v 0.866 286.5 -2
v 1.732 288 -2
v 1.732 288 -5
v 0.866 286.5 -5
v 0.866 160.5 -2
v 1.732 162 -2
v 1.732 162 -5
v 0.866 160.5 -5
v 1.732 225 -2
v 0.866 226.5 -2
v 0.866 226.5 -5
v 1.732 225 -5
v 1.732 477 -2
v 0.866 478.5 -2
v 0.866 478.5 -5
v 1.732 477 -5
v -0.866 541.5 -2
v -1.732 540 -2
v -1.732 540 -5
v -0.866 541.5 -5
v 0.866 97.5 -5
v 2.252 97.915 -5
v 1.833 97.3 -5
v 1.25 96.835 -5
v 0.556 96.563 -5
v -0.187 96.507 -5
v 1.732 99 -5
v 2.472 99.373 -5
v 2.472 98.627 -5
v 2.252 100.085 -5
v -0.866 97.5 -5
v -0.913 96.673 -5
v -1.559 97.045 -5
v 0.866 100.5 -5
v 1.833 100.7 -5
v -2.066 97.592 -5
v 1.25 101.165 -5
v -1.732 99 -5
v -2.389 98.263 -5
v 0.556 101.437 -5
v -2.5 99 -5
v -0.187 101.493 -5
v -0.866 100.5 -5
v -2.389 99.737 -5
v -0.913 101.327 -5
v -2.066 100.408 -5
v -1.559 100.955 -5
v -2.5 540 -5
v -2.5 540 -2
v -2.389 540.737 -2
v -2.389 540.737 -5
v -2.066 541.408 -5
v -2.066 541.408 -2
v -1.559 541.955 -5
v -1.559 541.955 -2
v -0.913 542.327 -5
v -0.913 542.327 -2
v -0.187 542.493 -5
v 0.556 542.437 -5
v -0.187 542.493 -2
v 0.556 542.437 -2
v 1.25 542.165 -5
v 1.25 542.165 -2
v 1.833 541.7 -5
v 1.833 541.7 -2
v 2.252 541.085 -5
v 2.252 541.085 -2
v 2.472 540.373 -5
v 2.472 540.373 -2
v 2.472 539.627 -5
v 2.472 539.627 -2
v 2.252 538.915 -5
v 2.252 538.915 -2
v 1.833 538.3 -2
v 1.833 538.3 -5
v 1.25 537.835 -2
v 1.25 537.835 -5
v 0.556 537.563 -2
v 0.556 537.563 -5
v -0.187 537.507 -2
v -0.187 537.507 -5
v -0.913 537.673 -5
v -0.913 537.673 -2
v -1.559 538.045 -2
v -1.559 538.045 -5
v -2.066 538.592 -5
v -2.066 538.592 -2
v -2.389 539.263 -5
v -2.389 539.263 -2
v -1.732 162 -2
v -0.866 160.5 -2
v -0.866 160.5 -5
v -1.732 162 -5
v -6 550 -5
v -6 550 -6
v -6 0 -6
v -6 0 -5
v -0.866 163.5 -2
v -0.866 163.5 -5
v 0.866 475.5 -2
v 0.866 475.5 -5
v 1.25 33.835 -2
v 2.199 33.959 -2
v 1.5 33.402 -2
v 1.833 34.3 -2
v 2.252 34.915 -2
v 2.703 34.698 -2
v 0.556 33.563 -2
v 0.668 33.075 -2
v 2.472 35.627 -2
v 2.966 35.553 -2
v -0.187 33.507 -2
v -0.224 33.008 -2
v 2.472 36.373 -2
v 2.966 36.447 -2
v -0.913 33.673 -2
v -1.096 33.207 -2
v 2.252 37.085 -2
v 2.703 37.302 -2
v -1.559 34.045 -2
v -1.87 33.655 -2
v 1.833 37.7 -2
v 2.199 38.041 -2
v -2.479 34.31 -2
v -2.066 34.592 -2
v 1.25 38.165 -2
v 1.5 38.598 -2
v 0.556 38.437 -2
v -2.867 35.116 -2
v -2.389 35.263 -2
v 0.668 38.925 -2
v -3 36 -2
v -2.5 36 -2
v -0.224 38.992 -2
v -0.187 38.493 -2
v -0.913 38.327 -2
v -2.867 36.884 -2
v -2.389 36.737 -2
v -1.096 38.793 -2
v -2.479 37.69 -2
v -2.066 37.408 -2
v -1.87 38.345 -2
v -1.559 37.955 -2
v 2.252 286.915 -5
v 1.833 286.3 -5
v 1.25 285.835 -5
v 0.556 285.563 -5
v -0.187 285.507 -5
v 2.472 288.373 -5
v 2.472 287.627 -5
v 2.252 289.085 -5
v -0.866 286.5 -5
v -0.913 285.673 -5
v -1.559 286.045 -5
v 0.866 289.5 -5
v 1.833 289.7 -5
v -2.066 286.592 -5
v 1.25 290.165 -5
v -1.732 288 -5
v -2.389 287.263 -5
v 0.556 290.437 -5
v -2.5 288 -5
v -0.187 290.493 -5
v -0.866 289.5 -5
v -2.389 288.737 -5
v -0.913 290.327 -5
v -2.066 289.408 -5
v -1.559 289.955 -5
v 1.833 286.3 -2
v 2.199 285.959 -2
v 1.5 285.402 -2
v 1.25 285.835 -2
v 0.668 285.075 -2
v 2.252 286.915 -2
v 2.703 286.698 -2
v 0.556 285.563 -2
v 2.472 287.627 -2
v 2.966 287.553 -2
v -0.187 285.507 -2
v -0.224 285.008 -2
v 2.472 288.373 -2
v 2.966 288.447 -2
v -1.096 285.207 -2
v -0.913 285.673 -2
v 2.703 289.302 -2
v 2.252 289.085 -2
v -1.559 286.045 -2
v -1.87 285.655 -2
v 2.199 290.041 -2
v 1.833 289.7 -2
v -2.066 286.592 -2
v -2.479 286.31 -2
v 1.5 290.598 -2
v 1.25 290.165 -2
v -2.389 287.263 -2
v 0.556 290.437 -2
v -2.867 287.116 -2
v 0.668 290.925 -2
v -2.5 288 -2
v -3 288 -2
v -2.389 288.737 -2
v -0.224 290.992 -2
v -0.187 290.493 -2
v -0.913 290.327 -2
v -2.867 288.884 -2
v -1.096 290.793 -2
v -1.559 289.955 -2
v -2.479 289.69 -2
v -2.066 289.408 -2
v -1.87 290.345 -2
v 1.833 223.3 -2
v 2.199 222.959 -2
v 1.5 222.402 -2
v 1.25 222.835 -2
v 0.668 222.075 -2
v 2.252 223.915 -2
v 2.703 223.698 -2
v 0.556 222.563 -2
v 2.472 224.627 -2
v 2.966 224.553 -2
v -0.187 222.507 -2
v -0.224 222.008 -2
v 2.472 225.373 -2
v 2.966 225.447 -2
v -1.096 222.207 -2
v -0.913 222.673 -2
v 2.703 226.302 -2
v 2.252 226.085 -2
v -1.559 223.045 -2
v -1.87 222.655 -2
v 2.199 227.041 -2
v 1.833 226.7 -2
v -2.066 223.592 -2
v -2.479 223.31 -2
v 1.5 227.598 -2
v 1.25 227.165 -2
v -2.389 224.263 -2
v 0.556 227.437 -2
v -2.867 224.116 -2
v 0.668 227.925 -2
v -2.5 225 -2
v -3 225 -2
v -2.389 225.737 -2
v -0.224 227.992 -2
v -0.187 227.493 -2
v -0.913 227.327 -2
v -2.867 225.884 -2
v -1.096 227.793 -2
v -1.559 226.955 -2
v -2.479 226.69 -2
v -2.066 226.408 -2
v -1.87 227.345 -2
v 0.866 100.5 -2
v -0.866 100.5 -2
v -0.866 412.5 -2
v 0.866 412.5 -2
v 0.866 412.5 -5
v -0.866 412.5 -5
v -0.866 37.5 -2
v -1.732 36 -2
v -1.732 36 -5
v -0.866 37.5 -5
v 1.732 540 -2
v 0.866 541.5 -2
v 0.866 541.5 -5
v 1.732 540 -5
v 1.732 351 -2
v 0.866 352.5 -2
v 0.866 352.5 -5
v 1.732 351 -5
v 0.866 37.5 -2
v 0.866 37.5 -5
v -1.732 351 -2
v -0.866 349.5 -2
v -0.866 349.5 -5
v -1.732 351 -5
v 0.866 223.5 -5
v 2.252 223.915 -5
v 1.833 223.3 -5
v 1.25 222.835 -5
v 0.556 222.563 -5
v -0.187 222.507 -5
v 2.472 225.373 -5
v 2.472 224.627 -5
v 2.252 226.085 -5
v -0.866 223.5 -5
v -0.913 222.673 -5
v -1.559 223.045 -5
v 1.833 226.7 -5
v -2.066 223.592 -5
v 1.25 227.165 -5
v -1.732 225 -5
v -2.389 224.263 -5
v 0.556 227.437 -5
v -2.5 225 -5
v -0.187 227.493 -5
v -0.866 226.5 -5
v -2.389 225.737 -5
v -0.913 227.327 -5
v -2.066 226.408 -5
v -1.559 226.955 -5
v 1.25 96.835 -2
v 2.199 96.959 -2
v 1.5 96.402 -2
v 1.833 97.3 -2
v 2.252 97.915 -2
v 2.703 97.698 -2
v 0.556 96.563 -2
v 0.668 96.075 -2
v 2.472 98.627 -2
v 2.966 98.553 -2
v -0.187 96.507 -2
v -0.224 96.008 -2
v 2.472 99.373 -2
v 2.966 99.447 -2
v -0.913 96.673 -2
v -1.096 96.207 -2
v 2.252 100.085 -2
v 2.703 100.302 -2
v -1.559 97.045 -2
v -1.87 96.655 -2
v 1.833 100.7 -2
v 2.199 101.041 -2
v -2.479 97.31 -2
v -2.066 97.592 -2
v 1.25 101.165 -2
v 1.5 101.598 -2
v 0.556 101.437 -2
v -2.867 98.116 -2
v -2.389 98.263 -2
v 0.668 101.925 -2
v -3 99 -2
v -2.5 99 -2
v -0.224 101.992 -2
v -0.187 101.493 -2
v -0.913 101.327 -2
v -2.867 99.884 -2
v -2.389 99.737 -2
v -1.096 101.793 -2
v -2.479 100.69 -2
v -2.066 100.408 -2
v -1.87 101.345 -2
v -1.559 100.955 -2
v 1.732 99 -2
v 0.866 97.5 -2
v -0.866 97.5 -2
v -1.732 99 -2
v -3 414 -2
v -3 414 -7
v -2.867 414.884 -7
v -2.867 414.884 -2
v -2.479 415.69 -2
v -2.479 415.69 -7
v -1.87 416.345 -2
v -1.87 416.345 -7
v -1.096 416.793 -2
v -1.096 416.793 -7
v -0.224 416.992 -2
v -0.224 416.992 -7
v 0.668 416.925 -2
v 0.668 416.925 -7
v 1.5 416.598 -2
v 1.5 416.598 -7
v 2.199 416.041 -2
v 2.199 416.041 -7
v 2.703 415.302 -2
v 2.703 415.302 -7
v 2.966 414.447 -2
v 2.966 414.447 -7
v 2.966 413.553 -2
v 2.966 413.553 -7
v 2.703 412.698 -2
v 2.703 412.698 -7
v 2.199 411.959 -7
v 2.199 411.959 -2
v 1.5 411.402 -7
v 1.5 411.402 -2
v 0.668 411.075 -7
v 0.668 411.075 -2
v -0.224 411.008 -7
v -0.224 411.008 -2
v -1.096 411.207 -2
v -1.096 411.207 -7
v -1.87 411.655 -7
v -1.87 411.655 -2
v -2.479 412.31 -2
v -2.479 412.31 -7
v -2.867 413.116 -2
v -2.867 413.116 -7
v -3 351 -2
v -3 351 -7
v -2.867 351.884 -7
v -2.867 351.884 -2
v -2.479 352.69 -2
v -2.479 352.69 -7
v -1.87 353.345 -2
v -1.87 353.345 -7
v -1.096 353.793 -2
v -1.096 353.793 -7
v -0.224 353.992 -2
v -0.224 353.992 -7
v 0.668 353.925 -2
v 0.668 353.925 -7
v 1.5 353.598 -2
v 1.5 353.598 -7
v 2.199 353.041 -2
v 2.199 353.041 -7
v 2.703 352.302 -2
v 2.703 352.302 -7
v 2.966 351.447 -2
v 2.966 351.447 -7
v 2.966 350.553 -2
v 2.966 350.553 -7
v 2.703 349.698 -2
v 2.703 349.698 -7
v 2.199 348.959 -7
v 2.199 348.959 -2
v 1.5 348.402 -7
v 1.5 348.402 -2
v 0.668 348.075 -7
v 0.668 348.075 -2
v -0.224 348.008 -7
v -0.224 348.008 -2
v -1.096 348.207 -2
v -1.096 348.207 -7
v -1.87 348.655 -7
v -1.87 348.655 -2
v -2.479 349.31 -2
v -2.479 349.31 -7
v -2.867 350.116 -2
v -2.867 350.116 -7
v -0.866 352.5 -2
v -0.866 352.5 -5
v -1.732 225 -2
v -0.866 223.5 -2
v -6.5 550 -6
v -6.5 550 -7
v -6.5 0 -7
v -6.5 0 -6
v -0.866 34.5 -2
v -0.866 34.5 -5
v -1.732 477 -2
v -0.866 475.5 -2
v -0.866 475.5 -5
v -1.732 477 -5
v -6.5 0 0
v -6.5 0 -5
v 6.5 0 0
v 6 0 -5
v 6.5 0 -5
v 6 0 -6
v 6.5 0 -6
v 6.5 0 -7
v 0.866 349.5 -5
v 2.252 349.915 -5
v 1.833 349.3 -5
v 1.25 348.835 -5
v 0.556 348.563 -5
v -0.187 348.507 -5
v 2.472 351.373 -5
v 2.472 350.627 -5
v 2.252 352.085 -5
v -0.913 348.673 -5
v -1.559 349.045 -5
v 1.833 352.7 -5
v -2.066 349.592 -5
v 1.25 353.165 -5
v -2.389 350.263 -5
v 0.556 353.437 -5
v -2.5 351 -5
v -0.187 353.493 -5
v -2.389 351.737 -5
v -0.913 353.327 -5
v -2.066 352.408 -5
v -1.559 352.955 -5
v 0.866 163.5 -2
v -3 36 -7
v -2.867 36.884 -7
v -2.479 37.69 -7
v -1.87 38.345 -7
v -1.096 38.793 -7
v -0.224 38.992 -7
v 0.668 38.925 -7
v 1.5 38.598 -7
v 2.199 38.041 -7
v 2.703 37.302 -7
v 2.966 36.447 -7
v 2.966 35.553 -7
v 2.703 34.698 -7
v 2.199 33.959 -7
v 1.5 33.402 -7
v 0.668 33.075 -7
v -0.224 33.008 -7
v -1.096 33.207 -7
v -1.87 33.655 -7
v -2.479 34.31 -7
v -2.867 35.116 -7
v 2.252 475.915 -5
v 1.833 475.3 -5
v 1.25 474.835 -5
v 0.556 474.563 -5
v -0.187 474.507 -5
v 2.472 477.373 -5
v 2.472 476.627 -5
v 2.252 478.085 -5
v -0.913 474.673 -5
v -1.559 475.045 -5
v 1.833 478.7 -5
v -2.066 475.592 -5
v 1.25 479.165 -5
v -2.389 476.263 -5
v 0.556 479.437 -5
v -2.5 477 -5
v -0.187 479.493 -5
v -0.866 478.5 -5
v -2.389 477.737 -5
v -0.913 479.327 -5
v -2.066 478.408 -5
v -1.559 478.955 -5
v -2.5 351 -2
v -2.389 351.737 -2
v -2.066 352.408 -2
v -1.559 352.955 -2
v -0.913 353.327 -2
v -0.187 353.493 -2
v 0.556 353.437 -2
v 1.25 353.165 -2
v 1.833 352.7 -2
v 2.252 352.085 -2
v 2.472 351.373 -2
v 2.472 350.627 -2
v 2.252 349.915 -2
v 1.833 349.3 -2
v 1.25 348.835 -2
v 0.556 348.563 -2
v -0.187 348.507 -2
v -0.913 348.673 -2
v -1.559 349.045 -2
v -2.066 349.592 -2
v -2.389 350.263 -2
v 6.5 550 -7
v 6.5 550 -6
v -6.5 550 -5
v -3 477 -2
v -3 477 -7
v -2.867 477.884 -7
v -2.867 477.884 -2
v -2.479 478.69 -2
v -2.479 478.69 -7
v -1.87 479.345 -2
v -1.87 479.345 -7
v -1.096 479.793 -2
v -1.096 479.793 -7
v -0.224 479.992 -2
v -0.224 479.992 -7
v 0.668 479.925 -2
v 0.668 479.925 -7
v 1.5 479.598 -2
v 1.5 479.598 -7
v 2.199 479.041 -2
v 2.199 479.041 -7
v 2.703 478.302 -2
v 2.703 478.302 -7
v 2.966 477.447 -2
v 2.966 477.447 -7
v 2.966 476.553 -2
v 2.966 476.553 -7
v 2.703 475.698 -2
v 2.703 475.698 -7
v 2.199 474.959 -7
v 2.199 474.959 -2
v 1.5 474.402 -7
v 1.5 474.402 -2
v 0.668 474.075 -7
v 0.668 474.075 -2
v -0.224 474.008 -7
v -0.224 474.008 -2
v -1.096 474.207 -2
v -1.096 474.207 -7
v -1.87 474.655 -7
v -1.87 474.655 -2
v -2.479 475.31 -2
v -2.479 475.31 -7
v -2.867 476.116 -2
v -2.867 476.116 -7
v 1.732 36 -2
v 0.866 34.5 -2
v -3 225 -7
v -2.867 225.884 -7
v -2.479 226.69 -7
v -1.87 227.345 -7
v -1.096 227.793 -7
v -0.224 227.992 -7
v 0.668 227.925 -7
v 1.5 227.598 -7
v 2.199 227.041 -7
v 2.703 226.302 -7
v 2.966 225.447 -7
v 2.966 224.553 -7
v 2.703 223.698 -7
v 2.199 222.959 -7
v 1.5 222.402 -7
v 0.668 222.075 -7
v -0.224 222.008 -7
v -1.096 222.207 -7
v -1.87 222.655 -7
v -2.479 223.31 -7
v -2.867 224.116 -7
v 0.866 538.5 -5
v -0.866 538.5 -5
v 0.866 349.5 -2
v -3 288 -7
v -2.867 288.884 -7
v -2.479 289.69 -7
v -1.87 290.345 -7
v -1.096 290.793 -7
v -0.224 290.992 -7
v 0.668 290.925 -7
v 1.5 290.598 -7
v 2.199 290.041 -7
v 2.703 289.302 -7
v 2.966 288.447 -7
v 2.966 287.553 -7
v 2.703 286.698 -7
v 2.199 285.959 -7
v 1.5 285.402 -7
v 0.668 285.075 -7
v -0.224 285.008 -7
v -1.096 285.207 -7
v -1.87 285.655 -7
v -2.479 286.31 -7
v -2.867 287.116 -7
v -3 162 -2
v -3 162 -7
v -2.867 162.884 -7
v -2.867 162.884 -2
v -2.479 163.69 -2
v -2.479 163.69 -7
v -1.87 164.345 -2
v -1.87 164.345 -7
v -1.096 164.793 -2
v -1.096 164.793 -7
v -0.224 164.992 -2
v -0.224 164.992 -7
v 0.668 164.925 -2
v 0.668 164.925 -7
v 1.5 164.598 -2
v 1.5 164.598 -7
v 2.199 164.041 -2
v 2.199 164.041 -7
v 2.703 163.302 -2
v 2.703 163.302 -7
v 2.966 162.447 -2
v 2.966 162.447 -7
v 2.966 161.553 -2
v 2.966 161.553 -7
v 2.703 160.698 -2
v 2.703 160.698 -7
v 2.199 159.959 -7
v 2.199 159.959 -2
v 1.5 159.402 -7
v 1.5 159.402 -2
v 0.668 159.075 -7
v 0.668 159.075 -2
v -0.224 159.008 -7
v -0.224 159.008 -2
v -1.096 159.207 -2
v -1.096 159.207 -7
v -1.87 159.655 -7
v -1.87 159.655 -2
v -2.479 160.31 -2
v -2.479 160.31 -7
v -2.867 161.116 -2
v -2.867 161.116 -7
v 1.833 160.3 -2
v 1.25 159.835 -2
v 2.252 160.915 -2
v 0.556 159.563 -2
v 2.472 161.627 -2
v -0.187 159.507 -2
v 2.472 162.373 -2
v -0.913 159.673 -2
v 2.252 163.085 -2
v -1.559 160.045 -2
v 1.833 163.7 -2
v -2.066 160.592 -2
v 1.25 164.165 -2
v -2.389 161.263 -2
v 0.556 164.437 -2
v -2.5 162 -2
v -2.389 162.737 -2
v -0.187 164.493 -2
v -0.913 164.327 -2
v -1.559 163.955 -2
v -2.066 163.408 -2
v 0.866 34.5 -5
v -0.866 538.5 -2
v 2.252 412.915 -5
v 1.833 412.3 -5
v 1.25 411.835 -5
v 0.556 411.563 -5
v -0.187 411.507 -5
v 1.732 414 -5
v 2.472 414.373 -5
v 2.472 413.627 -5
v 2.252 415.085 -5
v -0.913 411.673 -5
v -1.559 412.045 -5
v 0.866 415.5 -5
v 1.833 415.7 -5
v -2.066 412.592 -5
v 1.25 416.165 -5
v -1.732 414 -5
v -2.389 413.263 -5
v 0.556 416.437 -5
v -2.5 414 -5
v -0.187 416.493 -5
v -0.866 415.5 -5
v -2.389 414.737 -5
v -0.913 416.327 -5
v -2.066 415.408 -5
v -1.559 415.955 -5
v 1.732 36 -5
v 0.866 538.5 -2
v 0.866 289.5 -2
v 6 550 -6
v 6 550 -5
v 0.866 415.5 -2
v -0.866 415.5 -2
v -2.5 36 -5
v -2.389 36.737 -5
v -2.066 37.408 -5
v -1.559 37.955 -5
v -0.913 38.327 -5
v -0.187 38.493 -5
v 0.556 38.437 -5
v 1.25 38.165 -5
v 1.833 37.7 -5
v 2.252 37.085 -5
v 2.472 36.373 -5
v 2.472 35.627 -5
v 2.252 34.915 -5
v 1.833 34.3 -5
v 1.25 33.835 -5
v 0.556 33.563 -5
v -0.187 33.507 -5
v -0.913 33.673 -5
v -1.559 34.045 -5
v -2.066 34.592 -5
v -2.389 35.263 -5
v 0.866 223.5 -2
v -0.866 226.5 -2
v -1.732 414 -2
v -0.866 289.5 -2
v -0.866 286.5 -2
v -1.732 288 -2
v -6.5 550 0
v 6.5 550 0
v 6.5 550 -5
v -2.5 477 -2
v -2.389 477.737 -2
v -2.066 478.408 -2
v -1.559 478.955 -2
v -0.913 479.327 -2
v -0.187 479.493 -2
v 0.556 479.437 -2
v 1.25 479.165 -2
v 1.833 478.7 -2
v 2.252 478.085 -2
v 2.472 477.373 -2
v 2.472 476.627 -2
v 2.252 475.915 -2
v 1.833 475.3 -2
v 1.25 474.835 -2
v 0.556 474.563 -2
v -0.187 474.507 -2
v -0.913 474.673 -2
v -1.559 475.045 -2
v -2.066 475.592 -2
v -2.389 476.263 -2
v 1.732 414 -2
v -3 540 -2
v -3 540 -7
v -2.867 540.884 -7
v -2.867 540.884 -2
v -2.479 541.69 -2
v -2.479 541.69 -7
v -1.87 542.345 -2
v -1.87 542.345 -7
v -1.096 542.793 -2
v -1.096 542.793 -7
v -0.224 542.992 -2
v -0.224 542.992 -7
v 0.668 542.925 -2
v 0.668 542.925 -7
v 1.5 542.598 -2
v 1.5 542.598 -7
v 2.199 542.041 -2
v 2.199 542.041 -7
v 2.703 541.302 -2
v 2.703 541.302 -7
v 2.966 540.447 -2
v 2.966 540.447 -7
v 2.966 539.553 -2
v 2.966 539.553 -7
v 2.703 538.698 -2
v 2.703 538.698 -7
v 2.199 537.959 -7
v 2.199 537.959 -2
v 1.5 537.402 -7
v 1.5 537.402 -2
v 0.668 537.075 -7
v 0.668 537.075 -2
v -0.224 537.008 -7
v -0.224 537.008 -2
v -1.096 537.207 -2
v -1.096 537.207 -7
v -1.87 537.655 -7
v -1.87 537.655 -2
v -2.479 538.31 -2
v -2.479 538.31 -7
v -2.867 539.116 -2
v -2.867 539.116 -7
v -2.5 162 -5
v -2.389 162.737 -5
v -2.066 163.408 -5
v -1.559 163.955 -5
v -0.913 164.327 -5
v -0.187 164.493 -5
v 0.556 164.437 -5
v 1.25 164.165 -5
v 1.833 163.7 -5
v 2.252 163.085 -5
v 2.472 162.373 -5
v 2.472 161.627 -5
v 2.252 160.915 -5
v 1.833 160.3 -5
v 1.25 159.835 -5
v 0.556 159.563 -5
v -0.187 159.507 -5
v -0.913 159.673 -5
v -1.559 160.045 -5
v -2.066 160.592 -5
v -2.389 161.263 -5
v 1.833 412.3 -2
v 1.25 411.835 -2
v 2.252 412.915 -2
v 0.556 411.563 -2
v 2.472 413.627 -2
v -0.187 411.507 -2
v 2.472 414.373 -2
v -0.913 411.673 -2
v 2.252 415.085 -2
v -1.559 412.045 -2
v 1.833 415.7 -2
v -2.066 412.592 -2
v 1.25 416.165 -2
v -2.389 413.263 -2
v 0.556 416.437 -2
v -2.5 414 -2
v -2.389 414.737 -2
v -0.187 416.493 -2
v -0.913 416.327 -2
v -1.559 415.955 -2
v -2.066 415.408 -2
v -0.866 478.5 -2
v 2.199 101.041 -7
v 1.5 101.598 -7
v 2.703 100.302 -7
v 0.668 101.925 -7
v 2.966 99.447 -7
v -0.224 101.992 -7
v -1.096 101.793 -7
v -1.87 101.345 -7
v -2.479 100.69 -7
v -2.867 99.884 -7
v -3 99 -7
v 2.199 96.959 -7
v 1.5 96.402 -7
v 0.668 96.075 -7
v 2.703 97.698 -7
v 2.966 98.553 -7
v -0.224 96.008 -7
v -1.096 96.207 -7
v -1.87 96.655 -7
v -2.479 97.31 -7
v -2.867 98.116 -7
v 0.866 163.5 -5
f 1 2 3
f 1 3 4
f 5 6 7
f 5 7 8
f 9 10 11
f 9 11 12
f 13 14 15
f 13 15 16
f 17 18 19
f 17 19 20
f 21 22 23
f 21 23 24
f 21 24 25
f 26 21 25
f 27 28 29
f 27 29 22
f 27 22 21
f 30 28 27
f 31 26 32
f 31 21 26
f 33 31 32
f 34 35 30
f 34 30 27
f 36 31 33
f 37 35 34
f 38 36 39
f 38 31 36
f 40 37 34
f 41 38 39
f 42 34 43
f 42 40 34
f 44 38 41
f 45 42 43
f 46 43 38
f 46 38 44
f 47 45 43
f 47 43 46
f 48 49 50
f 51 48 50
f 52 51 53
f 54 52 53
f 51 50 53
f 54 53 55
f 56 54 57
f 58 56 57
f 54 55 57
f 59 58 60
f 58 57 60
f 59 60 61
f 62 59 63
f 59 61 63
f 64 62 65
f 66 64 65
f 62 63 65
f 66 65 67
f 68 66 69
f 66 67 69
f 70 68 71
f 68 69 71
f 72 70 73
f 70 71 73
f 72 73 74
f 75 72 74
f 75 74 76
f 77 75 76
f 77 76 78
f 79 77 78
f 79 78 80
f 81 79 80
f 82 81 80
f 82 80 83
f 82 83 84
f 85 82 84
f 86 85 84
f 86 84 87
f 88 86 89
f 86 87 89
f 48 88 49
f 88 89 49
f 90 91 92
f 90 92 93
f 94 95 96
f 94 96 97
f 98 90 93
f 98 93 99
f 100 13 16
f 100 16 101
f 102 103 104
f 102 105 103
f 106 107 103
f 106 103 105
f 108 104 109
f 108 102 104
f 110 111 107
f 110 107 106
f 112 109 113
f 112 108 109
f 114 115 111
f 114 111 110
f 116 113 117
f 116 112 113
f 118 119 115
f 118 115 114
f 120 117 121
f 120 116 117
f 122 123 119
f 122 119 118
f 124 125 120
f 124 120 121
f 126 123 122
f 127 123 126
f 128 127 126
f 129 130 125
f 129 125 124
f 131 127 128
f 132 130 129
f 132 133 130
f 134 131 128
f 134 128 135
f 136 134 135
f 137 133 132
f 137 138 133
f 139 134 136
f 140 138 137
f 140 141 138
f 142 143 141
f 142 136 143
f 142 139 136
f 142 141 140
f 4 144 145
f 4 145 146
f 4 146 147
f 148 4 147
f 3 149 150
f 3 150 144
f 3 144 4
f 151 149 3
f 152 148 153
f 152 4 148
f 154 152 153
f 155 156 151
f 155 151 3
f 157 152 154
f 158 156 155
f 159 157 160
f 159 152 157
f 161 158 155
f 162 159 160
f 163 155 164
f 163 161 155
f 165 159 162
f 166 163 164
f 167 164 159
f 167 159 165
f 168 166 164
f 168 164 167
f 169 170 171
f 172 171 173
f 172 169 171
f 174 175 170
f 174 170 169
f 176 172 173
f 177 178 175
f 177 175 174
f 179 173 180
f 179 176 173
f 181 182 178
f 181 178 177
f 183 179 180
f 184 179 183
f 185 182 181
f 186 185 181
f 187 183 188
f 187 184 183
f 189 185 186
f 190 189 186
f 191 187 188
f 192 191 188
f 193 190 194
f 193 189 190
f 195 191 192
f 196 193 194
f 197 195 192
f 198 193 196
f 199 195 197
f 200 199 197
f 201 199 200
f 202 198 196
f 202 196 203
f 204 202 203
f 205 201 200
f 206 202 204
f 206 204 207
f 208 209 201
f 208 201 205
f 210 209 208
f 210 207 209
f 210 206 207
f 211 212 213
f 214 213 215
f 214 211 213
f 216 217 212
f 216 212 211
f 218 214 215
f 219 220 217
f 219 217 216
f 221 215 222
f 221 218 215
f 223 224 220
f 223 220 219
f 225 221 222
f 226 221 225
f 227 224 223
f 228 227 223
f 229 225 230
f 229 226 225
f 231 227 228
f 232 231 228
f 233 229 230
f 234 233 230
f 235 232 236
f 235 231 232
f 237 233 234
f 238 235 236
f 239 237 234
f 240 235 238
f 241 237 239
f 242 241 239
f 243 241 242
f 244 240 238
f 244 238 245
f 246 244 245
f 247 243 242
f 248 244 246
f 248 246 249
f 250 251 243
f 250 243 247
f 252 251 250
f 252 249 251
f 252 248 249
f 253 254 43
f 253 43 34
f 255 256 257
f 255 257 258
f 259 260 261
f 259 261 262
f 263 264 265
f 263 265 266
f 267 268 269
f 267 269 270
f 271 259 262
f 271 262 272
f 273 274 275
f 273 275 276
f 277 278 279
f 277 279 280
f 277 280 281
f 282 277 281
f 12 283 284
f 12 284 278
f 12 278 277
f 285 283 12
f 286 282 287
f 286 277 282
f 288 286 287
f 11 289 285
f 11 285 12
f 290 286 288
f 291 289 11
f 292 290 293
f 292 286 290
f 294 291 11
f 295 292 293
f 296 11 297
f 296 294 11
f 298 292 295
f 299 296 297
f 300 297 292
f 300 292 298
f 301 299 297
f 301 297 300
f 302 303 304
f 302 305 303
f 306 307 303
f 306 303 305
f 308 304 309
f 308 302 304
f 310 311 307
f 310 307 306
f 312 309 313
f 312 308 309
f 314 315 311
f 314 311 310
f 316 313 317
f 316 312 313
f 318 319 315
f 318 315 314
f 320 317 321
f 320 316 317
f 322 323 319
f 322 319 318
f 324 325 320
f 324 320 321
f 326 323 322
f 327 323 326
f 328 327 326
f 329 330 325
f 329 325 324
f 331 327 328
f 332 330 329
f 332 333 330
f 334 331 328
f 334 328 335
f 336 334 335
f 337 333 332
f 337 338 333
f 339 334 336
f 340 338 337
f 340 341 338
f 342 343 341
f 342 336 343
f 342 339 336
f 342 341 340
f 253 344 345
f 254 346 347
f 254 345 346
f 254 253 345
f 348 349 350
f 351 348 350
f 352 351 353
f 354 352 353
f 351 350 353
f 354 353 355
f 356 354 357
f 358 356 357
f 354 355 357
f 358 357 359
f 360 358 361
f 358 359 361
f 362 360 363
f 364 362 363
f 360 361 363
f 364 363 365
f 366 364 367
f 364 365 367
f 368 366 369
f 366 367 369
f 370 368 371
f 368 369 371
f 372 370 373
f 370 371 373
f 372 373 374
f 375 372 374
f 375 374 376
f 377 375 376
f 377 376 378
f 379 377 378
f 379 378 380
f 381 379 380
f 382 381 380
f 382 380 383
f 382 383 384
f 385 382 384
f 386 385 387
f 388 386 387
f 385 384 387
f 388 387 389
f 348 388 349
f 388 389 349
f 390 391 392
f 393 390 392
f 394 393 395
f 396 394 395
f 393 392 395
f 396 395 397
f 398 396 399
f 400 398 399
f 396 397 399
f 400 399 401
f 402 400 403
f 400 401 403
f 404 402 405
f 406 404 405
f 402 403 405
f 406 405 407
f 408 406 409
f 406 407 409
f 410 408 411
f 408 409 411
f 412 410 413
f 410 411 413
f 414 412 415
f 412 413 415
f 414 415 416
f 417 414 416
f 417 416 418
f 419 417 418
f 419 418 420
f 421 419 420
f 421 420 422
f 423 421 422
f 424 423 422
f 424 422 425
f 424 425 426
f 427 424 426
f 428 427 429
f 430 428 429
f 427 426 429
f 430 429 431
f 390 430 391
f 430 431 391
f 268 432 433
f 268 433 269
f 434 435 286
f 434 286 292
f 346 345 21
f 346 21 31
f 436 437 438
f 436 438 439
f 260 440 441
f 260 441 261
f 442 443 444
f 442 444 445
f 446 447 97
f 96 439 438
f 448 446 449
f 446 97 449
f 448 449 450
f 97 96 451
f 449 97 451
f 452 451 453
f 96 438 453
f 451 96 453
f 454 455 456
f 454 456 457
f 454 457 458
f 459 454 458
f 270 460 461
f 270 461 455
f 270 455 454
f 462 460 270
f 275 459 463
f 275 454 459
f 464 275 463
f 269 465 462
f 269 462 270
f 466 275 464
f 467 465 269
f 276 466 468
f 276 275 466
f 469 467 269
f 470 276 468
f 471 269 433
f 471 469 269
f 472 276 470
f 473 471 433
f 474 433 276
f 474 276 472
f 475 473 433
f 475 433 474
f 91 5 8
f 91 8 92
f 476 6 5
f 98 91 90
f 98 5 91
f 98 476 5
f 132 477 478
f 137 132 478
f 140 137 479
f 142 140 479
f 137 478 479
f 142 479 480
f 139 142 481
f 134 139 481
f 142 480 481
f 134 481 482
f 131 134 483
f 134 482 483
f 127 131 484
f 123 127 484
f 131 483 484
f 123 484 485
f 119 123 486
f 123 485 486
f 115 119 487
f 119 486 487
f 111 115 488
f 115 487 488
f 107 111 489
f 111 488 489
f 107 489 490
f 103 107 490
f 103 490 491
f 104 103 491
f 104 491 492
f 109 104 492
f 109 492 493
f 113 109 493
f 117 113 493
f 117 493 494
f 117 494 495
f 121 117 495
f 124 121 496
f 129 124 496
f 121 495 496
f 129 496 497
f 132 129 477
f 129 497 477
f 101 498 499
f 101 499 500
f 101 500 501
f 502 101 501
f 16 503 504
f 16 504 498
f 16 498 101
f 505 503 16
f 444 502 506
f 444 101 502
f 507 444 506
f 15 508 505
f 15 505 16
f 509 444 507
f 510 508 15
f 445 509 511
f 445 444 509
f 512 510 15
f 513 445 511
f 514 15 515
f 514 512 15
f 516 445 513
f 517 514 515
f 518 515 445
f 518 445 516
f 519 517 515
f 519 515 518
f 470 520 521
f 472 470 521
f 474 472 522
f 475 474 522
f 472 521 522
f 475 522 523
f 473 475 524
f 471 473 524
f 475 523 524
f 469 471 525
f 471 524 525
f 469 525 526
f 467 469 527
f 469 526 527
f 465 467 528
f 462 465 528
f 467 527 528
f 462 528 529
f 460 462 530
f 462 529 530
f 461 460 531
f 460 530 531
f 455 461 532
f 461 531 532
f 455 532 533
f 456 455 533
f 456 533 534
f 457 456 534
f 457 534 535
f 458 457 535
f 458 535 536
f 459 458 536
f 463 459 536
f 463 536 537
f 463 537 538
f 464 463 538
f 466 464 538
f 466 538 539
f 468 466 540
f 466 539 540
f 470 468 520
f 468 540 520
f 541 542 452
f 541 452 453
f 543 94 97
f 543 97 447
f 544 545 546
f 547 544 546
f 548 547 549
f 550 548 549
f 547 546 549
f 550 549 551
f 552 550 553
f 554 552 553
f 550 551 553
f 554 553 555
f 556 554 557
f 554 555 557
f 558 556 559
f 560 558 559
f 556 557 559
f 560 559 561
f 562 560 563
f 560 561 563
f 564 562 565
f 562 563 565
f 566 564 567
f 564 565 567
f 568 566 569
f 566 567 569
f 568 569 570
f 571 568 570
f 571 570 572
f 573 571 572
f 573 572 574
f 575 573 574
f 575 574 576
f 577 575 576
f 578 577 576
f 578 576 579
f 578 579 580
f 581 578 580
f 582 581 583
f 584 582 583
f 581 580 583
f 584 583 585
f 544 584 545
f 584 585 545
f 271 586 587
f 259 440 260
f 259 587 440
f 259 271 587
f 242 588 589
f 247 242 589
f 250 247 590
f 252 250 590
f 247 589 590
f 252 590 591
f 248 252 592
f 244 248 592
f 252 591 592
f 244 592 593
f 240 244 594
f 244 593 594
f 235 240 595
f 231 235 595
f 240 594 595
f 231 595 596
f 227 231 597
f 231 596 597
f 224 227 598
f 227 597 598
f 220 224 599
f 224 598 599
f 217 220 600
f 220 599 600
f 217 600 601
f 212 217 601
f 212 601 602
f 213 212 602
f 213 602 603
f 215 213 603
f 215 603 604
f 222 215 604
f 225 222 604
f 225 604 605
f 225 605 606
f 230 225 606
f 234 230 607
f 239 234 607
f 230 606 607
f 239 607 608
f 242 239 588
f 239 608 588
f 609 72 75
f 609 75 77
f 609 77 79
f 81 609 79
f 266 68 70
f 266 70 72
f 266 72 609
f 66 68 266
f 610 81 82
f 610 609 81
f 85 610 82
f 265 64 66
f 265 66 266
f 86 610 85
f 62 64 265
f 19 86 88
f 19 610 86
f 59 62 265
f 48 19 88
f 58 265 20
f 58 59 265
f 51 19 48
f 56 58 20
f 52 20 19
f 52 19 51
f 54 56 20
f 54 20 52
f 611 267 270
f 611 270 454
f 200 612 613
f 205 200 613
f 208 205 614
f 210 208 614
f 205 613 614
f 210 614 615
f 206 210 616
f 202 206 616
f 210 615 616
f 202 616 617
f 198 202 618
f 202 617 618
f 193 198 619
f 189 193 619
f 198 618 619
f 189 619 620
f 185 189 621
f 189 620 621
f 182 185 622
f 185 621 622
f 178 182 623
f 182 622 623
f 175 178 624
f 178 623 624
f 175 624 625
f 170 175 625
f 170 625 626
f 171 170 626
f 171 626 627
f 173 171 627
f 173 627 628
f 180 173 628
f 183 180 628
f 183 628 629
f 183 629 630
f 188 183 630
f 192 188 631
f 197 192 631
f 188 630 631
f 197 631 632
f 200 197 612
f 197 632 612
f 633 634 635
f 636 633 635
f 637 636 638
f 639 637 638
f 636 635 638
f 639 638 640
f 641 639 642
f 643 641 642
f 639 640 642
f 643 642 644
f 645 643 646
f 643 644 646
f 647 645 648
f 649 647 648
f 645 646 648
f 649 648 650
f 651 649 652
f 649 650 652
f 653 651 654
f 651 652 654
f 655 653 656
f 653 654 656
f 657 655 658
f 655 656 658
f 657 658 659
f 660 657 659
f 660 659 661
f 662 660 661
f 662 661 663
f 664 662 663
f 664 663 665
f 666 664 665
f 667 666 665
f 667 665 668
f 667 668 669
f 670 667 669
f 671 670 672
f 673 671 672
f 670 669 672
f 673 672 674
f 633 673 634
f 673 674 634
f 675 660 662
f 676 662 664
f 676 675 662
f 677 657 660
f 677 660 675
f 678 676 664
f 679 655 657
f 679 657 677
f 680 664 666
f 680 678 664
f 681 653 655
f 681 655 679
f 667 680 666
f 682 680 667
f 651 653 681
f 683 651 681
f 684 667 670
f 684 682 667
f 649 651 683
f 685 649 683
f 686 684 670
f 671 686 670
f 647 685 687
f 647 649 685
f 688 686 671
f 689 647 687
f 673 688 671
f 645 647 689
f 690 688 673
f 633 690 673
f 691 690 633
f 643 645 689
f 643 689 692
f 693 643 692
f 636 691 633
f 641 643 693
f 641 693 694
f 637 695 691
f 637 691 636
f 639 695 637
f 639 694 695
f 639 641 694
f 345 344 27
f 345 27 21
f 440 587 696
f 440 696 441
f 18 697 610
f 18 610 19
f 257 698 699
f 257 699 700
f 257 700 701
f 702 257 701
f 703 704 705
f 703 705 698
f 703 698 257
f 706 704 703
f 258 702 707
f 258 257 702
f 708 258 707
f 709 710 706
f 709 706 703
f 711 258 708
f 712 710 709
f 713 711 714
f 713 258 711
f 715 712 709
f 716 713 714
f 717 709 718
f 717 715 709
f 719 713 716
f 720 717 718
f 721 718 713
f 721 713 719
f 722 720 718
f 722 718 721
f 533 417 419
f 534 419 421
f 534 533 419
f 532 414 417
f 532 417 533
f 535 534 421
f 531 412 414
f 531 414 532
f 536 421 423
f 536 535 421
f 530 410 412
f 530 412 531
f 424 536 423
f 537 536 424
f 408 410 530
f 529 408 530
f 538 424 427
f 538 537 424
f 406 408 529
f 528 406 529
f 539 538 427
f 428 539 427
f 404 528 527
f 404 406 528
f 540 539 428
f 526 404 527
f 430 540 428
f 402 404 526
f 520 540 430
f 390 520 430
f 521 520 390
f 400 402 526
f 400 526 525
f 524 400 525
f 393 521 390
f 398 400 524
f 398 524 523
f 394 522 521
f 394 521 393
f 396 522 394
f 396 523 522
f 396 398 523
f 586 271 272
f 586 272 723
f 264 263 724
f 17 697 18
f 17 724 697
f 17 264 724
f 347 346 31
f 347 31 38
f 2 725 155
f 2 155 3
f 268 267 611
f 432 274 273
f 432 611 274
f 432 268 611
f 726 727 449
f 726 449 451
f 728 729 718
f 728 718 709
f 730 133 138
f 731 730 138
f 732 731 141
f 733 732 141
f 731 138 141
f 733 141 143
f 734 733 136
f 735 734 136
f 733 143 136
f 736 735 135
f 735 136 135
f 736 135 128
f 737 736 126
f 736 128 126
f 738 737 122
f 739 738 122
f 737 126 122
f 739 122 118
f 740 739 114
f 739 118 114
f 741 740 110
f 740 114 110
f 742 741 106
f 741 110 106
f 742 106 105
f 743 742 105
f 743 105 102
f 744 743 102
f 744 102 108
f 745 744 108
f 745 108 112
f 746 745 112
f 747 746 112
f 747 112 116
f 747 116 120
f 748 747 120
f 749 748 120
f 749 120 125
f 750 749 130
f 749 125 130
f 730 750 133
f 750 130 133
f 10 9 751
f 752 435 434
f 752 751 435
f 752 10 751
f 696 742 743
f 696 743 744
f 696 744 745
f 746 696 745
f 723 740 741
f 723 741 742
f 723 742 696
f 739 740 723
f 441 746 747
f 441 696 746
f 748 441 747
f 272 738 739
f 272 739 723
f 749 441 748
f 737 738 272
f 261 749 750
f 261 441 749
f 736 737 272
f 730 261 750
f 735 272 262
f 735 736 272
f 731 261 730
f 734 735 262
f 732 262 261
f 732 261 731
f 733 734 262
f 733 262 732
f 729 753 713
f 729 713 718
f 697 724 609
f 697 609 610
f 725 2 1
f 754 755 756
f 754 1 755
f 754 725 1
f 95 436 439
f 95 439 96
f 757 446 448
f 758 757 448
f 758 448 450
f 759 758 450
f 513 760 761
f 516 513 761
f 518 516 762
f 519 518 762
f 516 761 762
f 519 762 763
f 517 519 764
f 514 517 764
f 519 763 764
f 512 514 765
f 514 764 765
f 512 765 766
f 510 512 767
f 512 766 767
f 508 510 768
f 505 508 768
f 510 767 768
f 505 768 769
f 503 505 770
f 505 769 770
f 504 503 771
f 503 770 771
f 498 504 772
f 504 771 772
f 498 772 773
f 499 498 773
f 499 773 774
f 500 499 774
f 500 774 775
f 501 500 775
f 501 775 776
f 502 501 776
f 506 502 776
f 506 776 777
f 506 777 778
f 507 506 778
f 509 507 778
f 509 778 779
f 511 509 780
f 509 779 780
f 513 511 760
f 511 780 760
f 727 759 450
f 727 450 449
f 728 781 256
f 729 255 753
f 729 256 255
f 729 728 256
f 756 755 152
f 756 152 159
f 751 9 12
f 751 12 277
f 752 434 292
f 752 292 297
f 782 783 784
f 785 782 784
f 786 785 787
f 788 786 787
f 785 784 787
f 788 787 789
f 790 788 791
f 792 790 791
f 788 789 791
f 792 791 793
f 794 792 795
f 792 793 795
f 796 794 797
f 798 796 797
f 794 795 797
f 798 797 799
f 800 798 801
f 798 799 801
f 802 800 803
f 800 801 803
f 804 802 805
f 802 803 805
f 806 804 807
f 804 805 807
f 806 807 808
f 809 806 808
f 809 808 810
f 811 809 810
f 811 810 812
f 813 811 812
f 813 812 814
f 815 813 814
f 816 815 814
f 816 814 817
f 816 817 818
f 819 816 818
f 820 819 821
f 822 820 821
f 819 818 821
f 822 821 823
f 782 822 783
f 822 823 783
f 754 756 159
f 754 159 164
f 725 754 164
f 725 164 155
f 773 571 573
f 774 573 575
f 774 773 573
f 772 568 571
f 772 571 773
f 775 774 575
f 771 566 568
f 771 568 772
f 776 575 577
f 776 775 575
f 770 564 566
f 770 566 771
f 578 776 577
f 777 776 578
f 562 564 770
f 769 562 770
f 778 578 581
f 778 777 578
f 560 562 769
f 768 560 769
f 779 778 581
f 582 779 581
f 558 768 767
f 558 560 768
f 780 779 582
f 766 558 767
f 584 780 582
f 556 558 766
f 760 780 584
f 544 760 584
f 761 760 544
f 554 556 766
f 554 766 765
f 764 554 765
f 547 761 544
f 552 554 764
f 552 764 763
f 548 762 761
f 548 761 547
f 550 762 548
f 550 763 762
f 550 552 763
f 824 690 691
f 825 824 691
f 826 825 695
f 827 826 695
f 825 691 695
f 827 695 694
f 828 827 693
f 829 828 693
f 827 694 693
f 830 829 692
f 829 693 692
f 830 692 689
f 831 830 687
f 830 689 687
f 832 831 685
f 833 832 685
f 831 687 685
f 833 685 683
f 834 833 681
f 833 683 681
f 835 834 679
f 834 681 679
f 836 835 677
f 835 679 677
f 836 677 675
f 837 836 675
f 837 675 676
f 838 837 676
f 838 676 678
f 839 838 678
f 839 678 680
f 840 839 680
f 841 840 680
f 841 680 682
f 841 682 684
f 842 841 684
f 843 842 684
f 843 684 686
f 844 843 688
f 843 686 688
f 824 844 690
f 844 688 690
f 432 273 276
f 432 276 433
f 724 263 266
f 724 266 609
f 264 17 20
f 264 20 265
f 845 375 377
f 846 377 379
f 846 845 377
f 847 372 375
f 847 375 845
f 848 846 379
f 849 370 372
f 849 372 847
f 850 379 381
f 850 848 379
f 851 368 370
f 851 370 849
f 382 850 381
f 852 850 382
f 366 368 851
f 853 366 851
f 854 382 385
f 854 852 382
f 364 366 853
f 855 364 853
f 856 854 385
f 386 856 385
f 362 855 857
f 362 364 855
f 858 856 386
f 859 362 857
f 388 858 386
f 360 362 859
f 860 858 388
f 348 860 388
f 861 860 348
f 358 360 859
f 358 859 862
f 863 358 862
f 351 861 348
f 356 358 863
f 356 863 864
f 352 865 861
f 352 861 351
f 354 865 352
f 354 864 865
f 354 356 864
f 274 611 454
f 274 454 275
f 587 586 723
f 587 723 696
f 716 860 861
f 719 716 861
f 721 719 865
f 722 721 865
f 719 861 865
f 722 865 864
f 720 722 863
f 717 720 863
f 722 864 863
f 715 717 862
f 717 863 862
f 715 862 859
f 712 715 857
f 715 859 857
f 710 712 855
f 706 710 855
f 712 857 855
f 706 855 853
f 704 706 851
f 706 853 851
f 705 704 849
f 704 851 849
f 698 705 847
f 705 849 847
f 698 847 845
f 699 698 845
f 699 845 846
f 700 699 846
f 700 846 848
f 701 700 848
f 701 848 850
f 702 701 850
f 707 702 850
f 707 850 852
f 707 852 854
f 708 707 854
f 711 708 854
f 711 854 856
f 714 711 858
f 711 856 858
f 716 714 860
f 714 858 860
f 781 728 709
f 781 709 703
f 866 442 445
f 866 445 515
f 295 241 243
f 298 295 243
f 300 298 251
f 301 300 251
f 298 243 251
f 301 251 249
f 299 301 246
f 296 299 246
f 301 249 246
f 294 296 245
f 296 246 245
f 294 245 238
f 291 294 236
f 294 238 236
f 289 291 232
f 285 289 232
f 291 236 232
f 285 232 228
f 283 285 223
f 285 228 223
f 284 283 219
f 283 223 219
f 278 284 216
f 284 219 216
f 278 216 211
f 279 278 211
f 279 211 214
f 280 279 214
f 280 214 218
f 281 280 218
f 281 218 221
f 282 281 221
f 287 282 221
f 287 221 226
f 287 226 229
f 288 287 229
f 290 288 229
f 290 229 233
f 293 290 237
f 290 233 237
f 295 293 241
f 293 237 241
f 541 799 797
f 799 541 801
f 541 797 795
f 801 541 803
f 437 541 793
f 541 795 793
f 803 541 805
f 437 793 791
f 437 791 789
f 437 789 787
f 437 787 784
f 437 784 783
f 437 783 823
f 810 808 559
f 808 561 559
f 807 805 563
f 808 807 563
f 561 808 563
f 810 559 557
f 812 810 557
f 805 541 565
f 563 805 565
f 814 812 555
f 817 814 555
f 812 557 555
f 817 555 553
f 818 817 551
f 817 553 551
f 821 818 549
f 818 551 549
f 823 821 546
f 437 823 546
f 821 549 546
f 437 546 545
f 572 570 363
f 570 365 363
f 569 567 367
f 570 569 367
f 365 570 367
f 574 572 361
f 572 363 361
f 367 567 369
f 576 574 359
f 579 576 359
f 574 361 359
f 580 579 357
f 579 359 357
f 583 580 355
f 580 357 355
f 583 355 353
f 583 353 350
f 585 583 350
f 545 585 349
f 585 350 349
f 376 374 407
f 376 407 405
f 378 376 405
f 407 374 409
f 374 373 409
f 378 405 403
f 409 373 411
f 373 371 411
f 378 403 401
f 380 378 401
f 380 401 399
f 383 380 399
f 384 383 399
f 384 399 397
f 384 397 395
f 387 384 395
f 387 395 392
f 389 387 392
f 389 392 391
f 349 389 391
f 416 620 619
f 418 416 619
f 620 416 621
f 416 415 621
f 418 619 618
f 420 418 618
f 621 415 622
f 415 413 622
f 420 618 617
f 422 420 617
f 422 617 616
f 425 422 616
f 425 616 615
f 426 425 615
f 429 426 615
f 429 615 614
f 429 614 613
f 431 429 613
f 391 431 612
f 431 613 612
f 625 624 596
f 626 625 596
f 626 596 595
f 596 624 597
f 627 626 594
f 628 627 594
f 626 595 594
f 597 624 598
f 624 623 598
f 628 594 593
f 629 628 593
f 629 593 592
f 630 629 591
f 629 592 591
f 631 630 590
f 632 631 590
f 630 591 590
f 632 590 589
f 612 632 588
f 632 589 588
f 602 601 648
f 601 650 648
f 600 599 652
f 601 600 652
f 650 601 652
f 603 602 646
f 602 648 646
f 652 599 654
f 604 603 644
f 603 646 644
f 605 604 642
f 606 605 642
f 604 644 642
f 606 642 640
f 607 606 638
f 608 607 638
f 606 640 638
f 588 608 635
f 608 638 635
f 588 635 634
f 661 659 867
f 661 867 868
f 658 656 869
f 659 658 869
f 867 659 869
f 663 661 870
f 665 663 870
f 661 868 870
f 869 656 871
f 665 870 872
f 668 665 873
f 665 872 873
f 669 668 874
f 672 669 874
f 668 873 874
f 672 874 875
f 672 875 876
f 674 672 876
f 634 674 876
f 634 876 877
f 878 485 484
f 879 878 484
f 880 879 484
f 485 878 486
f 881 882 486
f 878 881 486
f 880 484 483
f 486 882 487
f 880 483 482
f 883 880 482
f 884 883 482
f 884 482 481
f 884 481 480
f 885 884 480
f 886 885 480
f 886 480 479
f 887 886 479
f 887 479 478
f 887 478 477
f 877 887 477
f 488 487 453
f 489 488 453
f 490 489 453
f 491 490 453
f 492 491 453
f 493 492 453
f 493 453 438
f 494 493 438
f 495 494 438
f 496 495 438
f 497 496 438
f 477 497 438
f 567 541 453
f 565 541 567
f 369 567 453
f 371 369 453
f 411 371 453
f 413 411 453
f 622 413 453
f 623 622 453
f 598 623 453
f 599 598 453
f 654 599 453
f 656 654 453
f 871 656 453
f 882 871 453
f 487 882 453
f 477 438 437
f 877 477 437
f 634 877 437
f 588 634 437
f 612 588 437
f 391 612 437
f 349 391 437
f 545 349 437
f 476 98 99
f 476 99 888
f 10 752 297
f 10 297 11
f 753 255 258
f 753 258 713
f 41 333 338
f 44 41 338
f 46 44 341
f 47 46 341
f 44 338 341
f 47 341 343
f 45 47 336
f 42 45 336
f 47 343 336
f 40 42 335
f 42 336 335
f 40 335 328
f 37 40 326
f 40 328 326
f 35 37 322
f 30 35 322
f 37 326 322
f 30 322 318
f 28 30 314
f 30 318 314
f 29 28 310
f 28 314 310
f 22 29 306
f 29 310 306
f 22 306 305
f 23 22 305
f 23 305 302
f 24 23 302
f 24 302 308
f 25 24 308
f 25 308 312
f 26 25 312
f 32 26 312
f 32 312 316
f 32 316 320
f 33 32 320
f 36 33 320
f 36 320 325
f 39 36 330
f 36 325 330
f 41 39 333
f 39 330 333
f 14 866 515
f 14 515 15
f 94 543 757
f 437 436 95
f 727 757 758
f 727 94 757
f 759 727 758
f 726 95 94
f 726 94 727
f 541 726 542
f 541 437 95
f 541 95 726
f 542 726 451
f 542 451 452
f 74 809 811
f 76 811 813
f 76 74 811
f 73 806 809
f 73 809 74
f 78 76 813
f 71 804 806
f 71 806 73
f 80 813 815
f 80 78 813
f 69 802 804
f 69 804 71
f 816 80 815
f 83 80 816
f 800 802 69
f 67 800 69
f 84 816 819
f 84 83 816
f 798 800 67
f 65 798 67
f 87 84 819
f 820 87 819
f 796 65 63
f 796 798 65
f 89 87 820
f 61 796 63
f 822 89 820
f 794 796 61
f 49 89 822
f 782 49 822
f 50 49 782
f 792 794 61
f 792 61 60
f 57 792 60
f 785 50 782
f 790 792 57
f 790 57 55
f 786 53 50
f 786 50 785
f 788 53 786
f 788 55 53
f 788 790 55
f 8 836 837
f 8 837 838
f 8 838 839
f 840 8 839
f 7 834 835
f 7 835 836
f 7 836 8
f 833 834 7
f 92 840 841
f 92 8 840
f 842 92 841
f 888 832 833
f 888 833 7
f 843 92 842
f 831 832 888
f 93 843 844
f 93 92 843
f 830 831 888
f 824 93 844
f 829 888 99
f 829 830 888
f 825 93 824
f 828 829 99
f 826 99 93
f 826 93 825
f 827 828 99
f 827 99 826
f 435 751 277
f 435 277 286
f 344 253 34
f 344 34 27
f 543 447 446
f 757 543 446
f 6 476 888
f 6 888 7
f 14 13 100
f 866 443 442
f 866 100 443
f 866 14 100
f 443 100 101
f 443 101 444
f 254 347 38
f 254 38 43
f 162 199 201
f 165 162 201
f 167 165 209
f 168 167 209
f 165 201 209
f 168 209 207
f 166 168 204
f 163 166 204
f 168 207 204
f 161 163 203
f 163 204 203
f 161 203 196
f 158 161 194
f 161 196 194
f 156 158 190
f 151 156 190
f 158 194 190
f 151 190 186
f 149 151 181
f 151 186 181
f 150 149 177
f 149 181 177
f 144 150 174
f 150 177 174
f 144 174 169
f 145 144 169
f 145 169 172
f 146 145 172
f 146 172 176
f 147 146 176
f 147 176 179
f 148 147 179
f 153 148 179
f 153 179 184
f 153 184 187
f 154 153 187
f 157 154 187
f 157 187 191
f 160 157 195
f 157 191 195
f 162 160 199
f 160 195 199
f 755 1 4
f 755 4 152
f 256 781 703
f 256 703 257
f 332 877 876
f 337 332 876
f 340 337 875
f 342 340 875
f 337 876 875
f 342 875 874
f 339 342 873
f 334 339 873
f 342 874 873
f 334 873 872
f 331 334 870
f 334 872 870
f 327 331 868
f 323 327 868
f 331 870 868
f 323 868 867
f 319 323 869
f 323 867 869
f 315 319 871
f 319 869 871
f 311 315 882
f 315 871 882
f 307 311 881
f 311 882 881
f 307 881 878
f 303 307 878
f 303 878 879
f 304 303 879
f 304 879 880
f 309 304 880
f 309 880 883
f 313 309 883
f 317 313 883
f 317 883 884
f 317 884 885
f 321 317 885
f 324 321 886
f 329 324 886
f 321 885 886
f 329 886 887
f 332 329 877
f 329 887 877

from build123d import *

# Parameters (mm, degrees)
EXTRUDE_1_DEPTH        = 550
SKETCH_3_R             = 3
CUT_EXTRUDE_2_DEPTH    = 5
SKETCH_4_R             = 2.5
EXTRUDE_2_DEPTH        = 3
PATTERN_LINEAR_1_COUNT = 9
PATTERN_LINEAR_1_PITCH = 63


with BuildPart() as part:
    # 草圖1 → 填料-伸長1 (new body)
    with BuildSketch(Plane(origin=(0, 0, 0), x_dir=(1, 0, 0), z_dir=(0, 1, 0))):
        Polygon((-6.5, 0), (6.5, 0), (6.5, 5), (6, 5), (6, 6), (6.5, 6), (6.5, 7), (-6.5, 7), (-6.5, 6), (-6, 6), (-6, 5), (-6.5, 5), align=None)
    extrude(amount=EXTRUDE_1_DEPTH)

    # 草圖3 → 除料-伸長2 (cut)
    with BuildSketch(Plane(origin=(0, 0, -7), x_dir=(-1, 0, 0), z_dir=(0, 0, -1))):
        with Locations((0, 540)):
            Circle(SKETCH_3_R)
    cut_extrude_2 = extrude(amount=-CUT_EXTRUDE_2_DEPTH, mode=Mode.SUBTRACT)

    # 草圖4 → 填料-伸長2 (add)
    with BuildSketch(Plane(origin=(0, 0, -2), x_dir=(-1, 0, 0), z_dir=(0, 0, -1))):
        with Locations((0, 540)):
            Circle(SKETCH_4_R)
        Polygon((1.732050808, 540), (0.866025404, 541.5), (-0.866025404, 541.5), (-1.732050808, 540), (-0.866025404, 538.5), (0.866025404, 538.5), align=None, mode=Mode.SUBTRACT)
    extrude_2 = extrude(amount=EXTRUDE_2_DEPTH)

    # 直線複製排列1: 除料-伸長2, 填料-伸長2 ×9
    with Locations(*[(0, -i * PATTERN_LINEAR_1_PITCH, 0) for i in range(1, PATTERN_LINEAR_1_COUNT)]):
        add(cut_extrude_2, mode=Mode.SUBTRACT)
        add(extrude_2)


solid = part.part
